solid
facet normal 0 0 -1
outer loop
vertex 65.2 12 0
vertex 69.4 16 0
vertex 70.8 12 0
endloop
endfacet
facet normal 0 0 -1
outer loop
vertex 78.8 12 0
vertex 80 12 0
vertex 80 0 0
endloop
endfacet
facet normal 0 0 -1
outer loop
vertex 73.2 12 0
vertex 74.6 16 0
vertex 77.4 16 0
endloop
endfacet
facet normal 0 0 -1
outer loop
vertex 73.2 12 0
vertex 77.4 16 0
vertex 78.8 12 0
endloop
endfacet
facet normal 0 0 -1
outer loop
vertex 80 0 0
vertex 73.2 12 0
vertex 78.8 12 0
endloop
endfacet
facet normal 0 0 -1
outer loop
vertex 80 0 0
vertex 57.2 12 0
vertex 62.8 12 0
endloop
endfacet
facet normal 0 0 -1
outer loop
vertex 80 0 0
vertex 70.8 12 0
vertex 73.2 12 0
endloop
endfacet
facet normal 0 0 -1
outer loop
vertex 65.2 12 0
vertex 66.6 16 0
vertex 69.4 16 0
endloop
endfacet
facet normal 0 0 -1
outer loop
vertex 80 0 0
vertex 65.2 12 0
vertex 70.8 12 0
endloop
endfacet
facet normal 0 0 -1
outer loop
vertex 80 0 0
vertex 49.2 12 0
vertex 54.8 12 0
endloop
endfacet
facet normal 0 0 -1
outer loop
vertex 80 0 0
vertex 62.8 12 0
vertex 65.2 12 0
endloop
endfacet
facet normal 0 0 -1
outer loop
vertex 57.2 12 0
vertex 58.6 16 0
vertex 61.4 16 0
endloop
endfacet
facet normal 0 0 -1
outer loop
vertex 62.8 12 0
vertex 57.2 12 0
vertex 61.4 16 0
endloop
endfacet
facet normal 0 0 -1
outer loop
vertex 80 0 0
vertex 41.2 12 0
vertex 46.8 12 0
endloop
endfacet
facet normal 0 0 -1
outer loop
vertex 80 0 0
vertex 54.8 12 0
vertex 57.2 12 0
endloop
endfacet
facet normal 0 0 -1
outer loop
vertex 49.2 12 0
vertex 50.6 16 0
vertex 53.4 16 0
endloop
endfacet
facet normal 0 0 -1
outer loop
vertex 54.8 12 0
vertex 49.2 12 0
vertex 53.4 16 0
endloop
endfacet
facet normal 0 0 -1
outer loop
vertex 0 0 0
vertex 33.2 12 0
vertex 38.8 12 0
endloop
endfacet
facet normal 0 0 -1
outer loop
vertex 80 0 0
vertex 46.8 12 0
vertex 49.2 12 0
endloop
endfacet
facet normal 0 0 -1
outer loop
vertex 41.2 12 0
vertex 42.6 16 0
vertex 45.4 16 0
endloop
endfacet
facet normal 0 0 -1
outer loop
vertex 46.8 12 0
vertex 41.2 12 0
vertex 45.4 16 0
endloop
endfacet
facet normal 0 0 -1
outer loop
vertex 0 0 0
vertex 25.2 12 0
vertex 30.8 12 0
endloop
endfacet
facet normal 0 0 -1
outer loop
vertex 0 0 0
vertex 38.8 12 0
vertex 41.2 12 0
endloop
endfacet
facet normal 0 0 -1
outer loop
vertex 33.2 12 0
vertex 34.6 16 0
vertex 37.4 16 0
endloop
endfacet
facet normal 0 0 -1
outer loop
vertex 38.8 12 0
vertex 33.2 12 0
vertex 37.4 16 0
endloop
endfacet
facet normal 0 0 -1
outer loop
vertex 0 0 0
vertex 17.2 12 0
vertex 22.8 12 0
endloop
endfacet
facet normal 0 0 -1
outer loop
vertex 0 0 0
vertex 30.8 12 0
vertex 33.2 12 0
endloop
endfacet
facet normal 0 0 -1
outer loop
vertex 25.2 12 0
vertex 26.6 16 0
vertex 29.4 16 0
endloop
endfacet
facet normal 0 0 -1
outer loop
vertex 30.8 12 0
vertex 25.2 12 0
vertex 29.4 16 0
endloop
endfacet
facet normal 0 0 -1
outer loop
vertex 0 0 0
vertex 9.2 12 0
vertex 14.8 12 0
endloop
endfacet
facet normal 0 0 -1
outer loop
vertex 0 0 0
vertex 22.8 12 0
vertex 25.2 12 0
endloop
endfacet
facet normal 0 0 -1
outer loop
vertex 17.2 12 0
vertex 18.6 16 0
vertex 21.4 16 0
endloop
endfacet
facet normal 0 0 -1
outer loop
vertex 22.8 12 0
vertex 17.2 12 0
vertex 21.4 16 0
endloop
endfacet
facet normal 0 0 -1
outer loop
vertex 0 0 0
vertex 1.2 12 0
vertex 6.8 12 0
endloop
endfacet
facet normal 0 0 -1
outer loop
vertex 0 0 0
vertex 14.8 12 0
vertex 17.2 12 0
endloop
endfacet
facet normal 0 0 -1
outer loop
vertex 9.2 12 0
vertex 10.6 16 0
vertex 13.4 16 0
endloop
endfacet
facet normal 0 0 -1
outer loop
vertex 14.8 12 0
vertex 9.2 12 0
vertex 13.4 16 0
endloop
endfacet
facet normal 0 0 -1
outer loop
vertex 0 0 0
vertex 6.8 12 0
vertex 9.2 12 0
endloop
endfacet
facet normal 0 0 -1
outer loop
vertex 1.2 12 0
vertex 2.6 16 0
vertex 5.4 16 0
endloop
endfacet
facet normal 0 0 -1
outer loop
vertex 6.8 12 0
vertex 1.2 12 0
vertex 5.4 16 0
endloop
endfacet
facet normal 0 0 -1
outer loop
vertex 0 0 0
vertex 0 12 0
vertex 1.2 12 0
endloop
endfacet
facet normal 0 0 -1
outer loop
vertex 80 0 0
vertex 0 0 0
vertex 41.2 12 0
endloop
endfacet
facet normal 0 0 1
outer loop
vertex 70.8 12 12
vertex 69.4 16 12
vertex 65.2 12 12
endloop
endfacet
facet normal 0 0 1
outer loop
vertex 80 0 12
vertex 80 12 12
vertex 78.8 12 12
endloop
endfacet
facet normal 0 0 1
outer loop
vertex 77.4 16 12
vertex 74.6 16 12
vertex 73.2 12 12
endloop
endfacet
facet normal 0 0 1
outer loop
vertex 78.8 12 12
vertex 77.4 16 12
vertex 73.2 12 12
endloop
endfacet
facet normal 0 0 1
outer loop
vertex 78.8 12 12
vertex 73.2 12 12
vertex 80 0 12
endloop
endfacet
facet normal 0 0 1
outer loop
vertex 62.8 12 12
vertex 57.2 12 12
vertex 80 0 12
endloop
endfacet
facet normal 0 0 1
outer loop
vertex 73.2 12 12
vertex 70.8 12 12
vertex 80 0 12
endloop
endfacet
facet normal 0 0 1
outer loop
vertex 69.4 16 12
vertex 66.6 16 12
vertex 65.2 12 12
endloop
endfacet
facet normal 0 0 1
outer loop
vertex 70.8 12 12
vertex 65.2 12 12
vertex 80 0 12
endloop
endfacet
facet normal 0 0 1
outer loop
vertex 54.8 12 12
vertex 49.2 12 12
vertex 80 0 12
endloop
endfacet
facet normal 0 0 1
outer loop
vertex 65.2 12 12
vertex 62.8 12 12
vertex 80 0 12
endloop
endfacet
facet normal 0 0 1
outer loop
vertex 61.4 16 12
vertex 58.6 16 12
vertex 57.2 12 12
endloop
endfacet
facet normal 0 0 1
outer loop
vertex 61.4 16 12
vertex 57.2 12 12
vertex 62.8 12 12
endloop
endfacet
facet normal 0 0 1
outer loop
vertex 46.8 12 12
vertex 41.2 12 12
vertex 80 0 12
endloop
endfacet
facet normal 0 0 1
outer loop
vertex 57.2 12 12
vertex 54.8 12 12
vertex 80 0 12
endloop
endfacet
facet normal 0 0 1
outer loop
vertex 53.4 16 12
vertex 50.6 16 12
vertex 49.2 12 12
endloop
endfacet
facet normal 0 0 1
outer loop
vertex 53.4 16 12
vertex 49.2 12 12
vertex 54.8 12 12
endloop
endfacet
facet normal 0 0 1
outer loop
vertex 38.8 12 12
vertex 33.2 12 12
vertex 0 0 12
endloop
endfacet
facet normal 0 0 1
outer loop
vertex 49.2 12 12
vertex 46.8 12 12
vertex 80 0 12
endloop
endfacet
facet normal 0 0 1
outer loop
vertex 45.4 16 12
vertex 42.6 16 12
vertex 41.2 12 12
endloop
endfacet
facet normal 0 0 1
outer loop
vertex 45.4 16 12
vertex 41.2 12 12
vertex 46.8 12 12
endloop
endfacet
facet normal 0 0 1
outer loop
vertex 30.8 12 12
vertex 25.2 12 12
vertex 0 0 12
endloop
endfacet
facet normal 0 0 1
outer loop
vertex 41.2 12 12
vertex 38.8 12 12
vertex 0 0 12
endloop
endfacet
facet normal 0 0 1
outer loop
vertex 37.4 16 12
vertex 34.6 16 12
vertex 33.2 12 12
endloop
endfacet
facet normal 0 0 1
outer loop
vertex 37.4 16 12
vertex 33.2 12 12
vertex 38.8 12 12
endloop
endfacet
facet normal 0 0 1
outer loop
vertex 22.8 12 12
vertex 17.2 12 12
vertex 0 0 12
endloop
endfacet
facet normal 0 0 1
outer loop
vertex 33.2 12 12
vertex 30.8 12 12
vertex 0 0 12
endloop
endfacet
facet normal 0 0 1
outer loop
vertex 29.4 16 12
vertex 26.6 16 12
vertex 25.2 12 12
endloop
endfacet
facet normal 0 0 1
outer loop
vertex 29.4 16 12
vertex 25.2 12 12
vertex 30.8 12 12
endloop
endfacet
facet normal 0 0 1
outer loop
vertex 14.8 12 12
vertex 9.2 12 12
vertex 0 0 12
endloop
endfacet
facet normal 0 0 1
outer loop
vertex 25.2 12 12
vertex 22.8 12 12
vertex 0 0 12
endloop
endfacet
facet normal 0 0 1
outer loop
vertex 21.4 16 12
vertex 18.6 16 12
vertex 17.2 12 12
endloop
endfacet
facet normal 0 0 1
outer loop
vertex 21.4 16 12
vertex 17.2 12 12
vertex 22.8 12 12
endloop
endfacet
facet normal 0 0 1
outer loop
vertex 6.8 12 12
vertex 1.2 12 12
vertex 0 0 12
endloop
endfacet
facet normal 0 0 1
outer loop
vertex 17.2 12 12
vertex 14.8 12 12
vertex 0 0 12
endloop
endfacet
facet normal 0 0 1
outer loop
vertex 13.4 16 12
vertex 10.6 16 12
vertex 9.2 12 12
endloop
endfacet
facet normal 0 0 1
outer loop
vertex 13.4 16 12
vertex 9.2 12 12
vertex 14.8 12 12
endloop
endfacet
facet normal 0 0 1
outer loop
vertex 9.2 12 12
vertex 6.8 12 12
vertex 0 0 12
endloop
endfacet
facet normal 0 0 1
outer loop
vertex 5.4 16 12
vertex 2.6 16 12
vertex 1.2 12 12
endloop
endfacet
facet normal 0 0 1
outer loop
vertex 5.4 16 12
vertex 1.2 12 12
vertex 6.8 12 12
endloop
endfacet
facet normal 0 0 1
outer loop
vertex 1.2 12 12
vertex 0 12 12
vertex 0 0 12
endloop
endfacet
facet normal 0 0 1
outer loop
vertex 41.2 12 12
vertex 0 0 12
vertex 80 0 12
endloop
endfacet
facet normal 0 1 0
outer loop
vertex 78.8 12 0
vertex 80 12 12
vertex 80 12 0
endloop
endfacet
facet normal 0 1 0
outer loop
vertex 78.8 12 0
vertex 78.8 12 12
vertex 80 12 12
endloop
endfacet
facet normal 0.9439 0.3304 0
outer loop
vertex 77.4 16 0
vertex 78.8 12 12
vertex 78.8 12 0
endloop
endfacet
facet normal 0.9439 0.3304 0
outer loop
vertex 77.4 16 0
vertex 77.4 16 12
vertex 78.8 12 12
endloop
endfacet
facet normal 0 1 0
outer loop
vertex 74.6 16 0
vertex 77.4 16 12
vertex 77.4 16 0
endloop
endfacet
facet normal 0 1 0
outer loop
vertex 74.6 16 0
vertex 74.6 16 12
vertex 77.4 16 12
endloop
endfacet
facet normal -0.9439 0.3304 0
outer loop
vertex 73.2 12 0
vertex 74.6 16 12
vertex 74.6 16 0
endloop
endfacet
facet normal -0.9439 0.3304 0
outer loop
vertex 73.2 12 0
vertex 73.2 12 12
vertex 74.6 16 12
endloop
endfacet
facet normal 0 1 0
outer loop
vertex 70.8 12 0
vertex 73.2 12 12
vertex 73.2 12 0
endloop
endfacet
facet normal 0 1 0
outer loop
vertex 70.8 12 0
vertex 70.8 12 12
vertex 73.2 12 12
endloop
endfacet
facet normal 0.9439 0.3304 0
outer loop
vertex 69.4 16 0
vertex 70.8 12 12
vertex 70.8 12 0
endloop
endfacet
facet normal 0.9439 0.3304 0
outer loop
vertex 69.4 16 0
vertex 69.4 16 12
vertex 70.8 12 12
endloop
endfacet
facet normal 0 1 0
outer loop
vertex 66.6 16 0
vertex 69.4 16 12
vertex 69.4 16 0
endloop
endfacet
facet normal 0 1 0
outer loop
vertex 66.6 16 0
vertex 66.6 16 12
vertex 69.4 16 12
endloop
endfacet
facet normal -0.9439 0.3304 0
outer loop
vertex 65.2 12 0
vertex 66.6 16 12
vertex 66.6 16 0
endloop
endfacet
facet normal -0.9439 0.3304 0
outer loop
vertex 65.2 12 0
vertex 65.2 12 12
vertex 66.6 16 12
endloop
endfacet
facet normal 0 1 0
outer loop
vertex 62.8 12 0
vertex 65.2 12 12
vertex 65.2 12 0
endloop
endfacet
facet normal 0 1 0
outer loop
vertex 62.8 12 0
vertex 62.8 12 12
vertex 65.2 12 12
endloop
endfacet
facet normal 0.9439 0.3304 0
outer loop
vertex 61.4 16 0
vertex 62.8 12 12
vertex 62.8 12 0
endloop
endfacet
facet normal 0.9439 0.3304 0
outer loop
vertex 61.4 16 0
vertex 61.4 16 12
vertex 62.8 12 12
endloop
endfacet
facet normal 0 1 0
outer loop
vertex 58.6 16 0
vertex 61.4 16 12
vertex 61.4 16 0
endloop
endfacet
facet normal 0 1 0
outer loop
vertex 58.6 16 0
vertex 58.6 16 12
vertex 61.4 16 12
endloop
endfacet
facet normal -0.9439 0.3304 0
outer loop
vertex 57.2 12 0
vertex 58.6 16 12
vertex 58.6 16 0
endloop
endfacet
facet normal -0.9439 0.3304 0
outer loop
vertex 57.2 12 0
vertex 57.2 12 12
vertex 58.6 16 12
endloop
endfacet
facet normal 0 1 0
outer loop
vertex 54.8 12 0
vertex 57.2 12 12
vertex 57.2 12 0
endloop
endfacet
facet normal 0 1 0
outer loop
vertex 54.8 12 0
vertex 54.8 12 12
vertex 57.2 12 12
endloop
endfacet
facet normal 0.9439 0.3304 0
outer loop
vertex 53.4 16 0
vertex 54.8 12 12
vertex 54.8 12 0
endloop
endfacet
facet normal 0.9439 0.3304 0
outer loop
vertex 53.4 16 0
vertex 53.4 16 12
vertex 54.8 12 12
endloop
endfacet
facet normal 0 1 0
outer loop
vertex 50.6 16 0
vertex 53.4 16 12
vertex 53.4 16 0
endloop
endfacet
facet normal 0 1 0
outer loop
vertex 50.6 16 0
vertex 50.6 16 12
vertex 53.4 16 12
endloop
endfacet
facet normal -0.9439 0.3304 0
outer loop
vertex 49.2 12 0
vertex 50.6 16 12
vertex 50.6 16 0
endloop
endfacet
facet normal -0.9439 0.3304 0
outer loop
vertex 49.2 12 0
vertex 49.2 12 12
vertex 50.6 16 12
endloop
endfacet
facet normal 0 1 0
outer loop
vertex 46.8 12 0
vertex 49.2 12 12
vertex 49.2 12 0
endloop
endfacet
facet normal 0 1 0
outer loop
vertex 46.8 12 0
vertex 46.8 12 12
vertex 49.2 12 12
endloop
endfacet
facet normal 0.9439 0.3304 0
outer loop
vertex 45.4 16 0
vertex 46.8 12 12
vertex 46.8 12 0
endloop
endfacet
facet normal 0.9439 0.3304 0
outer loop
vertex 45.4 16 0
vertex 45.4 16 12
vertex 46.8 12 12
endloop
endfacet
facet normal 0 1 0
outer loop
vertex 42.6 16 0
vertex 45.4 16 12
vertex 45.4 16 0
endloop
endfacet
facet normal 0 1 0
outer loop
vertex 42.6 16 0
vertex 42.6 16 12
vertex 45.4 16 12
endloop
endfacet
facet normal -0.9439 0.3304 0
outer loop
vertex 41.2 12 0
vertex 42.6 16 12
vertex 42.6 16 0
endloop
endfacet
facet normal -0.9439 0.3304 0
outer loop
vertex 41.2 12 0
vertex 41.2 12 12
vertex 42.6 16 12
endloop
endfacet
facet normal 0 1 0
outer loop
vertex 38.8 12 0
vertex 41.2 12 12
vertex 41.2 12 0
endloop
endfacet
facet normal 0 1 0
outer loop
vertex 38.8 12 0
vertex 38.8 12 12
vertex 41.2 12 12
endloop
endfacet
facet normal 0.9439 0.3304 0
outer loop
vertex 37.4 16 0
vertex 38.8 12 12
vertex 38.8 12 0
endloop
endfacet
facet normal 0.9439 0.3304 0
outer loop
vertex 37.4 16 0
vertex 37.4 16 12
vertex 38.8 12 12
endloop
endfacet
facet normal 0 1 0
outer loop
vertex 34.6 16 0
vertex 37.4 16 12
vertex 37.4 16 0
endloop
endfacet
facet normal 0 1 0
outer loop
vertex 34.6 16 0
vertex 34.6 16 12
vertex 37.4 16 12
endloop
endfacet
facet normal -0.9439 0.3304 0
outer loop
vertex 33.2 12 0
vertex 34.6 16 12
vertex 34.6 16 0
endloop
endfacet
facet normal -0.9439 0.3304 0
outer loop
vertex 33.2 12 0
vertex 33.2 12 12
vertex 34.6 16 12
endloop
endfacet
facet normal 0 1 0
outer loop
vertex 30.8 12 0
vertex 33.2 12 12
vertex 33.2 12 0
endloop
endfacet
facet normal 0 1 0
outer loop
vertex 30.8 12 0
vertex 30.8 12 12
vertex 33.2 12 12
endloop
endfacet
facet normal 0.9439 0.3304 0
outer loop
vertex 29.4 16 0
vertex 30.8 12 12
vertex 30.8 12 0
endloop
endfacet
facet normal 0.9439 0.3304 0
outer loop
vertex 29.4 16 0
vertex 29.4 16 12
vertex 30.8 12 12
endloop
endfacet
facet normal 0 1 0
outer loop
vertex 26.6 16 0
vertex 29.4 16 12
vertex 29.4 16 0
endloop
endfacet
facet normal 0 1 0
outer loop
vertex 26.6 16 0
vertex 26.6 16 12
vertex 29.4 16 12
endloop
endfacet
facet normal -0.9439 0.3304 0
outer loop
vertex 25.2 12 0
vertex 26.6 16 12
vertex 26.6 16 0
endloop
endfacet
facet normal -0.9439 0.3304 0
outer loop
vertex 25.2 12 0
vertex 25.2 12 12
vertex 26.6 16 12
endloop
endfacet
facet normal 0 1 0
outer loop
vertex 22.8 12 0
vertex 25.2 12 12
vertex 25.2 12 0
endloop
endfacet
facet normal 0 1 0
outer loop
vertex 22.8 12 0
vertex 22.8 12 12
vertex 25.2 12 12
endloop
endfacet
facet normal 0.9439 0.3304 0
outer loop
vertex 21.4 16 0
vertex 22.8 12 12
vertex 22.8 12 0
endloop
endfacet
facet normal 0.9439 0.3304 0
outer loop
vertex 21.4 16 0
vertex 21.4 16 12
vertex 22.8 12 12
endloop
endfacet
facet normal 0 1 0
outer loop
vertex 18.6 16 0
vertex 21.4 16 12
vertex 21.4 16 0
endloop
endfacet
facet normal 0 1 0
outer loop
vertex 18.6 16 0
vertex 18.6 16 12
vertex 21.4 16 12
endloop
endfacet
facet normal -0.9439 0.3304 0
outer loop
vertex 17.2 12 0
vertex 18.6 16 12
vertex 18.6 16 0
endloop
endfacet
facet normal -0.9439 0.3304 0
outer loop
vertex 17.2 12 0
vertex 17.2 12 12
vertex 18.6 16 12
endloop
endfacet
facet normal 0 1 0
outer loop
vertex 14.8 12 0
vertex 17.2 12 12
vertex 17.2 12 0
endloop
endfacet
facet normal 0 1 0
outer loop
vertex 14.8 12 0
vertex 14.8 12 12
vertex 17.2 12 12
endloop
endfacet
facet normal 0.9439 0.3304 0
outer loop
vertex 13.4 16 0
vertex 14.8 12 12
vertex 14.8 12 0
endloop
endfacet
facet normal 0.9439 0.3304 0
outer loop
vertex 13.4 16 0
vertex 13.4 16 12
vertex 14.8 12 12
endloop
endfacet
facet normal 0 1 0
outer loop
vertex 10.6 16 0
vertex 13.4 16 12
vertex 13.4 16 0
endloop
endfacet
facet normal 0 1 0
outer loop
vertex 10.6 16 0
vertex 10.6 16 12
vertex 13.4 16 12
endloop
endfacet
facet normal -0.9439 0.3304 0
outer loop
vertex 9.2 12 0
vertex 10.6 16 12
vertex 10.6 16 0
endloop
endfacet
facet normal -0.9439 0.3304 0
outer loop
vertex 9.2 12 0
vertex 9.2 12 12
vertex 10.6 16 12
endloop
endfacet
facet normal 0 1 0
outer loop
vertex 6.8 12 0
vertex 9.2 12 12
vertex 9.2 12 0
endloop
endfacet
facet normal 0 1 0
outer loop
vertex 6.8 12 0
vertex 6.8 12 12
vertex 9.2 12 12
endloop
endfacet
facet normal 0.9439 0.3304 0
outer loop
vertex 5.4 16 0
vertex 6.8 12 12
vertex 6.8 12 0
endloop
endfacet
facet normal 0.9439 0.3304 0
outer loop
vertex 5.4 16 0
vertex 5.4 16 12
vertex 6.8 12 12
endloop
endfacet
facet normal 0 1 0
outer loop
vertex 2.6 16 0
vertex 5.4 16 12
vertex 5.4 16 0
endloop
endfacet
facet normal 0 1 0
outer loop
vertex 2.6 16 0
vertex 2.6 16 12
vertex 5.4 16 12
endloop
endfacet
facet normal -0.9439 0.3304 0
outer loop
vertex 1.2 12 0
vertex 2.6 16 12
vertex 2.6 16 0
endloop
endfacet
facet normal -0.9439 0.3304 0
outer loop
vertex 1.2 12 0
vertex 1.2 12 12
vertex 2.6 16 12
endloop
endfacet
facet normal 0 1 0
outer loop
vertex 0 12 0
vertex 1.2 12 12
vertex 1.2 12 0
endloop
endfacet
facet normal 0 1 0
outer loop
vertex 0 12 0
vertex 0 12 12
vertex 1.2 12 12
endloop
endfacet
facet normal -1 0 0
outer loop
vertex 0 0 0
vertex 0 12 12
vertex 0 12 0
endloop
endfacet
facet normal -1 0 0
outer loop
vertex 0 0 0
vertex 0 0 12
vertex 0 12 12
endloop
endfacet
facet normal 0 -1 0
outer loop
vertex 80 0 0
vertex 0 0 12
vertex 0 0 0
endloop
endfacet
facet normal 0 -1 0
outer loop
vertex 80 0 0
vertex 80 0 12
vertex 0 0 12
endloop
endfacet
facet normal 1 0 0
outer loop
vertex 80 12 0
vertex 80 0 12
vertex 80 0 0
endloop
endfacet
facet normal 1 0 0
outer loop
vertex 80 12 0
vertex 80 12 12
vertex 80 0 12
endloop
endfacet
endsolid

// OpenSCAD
$fn = 32;

// ----------------------------------------------------------------------
// Gear rack: 10 teeth, pitch 8 mm
// ----------------------------------------------------------------------

// --- parameters (mm) ---
teeth = 10;               // number of teeth
pitch = 8;                // tooth pitch, X
root_w = 5.6;             // tooth width at the root
tip_w = 2.8;              // tooth width at the tip
base_h = 12;              // rack body height, Y
tooth_h = 4;              // tooth height above the body
plate_t = 12;             // rack width, Z (extrusion height)

rack_l = teeth * pitch;  // overall length
total_h = base_h + tooth_h;  // overall height

profile = [[0, 0], [80, 0], [80, 12], [78.8, 12], [77.4, 16], [74.6, 16], [73.2, 12], [70.8, 12], [69.4, 16], [66.6, 16], [65.2, 12], [62.8, 12], [61.4, 16], [58.6, 16], [57.2, 12], [54.8, 12], [53.4, 16], [50.6, 16], [49.2, 12], [46.8, 12], [45.4, 16], [42.6, 16], [41.2, 12], [38.8, 12], [37.4, 16], [34.6, 16], [33.2, 12], [30.8, 12], [29.4, 16], [26.6, 16], [25.2, 12], [22.8, 12], [21.4, 16], [18.6, 16], [17.2, 12], [14.8, 12], [13.4, 16], [10.6, 16], [9.2, 12], [6.8, 12], [5.4, 16], [2.6, 16], [1.2, 12], [0, 12]];  // primary outline, 44 points, counter clockwise

// --- the one profile operation ---
linear_extrude(height = plate_t) polygon(points = profile);
